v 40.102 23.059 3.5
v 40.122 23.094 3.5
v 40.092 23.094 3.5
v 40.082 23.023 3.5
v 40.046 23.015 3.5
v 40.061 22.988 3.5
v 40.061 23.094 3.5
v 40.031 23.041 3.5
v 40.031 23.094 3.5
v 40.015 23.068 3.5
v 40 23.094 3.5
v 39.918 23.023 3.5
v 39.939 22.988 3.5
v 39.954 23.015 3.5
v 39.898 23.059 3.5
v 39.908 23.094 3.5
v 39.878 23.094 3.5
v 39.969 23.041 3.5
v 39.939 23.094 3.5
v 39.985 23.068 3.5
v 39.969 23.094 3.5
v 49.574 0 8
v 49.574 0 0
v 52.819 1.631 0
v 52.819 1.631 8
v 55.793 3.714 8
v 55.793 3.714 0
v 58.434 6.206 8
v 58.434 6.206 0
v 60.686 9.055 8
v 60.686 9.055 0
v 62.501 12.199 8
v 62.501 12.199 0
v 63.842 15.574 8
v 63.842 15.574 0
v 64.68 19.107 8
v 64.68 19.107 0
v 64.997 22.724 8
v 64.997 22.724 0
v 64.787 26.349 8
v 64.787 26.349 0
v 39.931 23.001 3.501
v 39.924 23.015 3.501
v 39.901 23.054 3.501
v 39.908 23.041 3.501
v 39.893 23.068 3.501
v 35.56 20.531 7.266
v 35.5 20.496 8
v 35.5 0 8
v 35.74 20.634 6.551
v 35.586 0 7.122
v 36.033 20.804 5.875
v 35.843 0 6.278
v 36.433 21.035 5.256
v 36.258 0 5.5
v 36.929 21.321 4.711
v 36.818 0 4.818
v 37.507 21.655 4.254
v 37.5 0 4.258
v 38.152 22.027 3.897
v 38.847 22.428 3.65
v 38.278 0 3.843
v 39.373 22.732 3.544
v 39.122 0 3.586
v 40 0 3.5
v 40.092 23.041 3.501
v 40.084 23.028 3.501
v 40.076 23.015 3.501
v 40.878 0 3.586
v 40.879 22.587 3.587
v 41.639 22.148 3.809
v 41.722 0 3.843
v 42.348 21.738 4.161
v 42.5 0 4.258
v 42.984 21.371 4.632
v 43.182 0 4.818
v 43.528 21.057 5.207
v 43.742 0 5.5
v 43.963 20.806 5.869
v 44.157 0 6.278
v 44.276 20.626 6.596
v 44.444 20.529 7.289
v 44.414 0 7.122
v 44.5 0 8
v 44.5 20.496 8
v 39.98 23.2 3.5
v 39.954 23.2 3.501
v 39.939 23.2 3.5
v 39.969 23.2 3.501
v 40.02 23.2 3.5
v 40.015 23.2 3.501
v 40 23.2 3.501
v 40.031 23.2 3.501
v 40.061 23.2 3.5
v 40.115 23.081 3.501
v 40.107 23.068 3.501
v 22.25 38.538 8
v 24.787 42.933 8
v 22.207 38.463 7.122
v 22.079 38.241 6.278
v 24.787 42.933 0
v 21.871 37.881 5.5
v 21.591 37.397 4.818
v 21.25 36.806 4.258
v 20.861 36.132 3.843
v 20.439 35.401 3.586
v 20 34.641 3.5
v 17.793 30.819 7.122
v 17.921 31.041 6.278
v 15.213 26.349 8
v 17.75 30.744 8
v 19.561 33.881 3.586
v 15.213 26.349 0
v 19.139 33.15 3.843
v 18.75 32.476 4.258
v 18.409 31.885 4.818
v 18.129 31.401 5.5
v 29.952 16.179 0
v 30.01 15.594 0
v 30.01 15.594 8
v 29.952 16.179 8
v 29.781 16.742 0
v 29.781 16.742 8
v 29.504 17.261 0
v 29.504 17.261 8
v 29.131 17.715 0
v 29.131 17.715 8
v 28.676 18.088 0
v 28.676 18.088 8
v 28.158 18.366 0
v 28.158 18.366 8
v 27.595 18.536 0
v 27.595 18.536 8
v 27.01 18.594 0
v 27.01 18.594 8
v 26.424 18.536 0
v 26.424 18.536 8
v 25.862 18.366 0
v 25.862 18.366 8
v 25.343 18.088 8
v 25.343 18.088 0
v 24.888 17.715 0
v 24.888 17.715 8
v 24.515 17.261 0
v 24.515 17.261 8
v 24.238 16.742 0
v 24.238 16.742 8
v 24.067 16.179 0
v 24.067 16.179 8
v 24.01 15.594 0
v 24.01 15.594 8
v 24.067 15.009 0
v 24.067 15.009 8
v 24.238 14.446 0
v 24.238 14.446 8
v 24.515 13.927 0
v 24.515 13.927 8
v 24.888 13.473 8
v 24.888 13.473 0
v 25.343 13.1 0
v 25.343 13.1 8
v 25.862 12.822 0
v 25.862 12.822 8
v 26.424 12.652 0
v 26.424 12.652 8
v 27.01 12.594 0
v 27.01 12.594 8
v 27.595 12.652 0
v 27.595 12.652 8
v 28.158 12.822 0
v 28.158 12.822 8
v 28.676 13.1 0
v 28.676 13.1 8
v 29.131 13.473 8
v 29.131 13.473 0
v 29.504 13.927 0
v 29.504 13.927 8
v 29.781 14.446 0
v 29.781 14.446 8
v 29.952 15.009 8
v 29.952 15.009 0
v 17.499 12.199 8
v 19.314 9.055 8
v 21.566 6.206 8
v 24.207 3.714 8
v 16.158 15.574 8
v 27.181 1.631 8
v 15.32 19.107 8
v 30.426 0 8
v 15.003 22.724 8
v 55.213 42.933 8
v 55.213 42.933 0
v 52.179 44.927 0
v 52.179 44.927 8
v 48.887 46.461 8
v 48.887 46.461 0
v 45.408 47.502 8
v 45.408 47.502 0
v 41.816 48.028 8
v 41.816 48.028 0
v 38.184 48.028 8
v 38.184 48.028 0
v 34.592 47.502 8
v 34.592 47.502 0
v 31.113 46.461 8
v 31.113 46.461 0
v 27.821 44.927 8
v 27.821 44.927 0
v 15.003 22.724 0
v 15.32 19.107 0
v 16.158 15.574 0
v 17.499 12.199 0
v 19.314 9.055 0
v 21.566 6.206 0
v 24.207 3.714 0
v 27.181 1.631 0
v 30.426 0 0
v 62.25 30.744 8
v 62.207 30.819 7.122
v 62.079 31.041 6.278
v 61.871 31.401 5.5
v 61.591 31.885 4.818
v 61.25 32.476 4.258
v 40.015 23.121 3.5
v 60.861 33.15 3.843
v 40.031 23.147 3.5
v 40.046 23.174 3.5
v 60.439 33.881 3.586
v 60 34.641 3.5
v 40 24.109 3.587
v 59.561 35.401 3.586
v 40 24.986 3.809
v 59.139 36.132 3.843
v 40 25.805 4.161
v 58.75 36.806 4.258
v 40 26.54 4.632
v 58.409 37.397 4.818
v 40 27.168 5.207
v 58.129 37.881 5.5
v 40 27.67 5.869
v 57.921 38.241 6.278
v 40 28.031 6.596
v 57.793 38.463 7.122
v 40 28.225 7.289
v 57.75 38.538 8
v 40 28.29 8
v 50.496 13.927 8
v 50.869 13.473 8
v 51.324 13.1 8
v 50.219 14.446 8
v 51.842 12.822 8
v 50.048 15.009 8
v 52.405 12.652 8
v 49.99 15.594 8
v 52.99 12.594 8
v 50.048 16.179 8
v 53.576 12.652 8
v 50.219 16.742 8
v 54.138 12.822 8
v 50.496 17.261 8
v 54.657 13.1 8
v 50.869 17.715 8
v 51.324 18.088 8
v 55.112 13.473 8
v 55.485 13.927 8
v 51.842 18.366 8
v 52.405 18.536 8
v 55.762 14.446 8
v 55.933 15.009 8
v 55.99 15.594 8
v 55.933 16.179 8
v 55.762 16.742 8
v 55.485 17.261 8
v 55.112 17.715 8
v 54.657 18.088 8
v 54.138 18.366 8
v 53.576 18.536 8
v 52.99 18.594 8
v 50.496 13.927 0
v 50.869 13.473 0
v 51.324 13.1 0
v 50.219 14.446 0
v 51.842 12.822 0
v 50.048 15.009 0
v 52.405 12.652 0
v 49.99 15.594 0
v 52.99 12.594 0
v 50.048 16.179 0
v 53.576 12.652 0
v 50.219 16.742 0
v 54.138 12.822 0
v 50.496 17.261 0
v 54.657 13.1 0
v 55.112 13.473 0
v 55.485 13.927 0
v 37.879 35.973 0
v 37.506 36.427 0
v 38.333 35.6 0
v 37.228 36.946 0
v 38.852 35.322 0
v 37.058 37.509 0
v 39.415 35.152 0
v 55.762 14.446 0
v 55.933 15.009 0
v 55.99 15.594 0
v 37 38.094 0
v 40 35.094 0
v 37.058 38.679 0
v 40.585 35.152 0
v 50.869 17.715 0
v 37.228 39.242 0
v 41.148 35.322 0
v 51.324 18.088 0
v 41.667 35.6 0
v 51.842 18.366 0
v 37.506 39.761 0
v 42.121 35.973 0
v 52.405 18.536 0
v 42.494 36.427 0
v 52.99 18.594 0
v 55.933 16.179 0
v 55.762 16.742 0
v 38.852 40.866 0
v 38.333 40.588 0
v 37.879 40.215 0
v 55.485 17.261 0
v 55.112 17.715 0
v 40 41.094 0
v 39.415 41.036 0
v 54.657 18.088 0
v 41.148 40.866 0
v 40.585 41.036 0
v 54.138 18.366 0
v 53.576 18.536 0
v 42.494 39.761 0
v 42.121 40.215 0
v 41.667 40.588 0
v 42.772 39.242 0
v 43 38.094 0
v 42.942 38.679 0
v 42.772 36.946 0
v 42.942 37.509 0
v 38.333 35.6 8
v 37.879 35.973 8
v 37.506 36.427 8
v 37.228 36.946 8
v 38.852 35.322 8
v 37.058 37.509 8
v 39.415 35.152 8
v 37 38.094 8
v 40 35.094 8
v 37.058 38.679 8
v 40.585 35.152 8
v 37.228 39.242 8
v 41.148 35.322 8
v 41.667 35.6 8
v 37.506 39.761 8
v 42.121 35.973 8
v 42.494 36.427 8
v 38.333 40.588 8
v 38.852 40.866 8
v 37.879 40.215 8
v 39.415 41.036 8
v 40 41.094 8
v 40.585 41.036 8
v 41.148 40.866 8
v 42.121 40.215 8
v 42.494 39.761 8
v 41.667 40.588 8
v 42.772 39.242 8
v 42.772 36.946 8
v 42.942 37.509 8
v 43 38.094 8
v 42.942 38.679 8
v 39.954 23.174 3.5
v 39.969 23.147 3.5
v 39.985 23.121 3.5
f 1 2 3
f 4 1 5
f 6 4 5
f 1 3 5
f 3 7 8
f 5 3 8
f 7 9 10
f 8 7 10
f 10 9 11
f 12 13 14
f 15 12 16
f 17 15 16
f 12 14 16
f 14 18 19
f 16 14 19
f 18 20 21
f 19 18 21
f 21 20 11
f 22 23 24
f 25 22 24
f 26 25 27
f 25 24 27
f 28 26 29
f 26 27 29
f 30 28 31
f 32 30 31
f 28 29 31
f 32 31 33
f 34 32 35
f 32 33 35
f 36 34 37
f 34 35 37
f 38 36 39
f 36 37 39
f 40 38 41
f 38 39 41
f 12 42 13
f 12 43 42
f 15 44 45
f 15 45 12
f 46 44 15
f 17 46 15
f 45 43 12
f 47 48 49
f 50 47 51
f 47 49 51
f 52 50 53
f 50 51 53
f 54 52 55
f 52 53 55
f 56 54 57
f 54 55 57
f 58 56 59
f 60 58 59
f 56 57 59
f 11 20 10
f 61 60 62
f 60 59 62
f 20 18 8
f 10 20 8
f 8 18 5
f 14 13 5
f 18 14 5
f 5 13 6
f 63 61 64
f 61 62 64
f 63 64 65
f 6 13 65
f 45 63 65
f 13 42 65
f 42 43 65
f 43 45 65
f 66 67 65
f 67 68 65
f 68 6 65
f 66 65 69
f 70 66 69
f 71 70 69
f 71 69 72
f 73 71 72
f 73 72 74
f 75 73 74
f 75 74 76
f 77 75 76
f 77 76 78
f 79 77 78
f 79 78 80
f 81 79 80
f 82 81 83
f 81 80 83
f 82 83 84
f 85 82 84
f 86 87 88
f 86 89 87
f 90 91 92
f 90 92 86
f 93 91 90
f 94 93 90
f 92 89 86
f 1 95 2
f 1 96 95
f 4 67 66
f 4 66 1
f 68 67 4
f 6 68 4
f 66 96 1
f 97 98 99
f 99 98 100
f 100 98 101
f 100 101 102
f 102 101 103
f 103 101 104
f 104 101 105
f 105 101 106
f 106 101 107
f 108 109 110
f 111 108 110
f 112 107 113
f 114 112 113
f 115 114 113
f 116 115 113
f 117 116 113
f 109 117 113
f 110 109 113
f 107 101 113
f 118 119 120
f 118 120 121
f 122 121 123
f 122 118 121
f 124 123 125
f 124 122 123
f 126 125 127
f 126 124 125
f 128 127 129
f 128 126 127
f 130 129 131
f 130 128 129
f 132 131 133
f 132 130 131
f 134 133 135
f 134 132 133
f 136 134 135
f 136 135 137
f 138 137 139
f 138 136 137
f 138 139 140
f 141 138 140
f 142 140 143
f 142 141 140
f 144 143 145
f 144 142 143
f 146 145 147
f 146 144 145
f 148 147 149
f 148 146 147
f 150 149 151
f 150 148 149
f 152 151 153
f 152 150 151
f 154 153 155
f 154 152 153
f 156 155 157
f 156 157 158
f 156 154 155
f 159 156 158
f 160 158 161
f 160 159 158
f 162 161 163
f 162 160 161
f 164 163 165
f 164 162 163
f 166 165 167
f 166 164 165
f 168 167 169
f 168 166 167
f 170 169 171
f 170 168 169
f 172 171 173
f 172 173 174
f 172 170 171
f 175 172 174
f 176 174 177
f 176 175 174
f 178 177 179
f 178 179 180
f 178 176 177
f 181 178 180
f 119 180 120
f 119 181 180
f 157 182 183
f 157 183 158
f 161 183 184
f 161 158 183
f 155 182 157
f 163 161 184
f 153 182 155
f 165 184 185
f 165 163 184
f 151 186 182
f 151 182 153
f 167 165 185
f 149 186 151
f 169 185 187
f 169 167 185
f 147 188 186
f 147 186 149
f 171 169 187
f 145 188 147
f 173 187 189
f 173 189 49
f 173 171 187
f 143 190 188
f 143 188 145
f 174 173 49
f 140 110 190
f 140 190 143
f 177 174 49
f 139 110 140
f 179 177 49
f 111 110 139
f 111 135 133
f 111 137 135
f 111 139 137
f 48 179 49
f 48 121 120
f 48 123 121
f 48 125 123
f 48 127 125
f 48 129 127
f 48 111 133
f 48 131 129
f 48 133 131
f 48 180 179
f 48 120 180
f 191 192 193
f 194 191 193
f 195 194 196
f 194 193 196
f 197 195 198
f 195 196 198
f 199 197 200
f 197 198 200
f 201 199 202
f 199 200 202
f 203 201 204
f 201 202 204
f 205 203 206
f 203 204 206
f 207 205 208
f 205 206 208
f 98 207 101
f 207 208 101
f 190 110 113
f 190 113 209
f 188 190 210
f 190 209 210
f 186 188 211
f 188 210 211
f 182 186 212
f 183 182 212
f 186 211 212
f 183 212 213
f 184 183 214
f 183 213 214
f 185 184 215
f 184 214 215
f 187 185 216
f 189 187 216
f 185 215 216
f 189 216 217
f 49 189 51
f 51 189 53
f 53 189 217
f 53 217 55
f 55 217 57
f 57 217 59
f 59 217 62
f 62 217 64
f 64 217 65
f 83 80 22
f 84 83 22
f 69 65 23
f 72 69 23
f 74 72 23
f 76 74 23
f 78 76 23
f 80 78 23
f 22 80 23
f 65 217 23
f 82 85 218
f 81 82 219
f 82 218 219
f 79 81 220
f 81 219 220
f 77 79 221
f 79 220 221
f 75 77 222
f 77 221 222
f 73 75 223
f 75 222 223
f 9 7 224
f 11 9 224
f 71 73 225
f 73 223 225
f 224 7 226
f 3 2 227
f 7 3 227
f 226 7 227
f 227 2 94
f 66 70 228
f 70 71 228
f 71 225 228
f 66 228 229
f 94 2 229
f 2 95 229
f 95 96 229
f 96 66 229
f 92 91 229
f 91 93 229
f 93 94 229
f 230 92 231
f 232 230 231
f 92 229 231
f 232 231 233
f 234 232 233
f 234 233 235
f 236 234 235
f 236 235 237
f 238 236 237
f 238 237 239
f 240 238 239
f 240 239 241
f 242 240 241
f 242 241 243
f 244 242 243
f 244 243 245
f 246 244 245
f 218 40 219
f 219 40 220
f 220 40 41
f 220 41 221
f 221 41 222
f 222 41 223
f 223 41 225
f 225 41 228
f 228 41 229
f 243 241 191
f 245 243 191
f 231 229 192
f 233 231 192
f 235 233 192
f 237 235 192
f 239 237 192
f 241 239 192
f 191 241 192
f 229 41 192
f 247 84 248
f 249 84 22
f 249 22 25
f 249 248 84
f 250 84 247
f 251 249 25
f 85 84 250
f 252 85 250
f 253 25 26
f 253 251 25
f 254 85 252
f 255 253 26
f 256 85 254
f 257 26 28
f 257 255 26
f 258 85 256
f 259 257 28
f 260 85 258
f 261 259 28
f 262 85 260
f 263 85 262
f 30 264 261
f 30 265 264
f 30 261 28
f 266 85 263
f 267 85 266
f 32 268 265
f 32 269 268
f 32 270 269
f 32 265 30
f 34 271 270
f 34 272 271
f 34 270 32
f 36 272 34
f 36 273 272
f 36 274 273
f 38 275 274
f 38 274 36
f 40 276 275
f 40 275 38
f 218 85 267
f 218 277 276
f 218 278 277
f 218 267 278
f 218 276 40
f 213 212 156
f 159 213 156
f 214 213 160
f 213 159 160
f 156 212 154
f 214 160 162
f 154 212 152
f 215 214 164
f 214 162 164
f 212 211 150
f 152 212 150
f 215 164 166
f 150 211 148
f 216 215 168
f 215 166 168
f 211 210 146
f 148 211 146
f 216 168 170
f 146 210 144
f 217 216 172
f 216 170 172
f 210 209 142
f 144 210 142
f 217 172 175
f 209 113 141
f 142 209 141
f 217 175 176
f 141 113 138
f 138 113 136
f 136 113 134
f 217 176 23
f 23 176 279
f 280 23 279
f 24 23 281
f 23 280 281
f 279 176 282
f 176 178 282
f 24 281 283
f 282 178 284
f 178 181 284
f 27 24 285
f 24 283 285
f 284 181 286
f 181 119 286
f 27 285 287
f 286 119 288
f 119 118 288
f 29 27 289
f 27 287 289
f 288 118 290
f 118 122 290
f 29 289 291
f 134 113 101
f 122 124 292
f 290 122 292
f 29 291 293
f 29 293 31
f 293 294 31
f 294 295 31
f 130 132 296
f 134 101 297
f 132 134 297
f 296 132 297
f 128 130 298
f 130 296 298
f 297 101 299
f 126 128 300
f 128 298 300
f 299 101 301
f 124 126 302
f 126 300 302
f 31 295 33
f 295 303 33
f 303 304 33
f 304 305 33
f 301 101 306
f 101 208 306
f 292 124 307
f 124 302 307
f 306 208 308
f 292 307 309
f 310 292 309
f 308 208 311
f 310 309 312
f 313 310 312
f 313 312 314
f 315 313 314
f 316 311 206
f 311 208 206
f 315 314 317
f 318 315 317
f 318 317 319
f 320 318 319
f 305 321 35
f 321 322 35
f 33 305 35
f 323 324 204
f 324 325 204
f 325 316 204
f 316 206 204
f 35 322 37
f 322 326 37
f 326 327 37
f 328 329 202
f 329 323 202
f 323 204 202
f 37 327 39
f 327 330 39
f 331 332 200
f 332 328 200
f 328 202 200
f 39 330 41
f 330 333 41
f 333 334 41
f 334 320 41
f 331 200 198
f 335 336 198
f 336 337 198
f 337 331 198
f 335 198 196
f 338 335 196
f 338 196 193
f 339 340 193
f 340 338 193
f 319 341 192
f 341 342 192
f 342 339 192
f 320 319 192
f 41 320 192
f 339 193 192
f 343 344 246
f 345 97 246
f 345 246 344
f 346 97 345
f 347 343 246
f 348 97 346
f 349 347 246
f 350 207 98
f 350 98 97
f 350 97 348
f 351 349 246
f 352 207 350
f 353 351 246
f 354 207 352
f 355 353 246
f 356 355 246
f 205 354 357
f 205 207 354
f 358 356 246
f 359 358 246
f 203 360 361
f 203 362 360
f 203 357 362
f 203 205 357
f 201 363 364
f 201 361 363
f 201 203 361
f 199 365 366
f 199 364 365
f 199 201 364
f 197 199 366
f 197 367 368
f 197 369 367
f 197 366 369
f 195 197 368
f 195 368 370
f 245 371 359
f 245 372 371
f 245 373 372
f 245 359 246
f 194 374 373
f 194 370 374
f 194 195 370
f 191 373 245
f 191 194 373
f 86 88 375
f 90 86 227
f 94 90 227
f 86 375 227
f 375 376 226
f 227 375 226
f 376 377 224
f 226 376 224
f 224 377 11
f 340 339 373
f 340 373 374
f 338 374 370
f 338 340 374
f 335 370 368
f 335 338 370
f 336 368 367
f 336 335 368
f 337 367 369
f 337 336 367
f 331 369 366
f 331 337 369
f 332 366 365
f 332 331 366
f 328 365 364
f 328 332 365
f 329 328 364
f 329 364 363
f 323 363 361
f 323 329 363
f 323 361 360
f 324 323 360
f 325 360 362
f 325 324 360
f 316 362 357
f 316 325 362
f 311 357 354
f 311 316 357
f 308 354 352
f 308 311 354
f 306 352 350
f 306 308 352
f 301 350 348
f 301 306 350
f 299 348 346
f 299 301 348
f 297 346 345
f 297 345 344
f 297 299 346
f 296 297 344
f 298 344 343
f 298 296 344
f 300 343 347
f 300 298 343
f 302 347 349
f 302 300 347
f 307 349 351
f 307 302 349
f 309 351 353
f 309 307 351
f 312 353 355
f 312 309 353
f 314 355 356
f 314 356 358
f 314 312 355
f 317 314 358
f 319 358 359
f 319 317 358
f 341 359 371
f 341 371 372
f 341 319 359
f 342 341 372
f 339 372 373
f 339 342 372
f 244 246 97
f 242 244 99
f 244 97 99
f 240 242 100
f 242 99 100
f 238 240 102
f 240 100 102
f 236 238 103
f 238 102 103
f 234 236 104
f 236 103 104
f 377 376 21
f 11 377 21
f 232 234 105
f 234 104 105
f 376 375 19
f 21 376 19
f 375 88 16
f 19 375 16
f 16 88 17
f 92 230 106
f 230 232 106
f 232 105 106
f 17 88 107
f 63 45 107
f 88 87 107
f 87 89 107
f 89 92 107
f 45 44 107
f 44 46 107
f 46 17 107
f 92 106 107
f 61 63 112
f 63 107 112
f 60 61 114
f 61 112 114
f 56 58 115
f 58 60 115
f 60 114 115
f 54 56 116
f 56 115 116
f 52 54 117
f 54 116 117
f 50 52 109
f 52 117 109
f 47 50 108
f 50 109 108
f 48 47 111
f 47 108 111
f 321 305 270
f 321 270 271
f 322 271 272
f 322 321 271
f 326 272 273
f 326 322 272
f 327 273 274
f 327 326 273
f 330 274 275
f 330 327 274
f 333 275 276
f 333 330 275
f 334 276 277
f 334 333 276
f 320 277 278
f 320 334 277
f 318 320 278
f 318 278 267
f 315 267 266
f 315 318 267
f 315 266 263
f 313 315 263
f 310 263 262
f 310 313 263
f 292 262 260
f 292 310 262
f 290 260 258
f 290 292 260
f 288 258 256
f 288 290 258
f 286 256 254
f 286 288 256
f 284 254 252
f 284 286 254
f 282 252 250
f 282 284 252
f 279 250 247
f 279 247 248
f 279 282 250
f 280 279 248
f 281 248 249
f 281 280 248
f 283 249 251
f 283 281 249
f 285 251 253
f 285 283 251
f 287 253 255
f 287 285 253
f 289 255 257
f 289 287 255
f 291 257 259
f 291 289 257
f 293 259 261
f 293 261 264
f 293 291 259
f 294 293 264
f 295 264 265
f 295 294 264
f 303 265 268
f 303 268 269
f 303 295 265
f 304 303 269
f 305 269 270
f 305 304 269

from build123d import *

# Parameters (mm, degrees)
F0_R     = 3
F1_DEPTH = 8
F2_R     = 4.5
F3_DEPTH = 23.2
F4_R     = 4.5
F5_DEPTH = 23.2
F6_R     = 4.5
F7_DEPTH = 23.2


with BuildPart() as f1:
    # F0 (on Top) → F1 (new body)
    with BuildSketch(Plane.XY):
        with BuildLine():
            Line((24.7871355388, 42.9325781273), (15.2128644612, 26.3494541755))
            ThreePointArc((15.2128644612, 26.3494541755), (18.3493649054, 10.5940107676), (30.4257289224, 0))
            Line((30.4257289224, 0), (49.5742710776, 0))
            ThreePointArc((49.5742710776, 0), (61.6506350946, 10.5940107676), (64.7871355388, 26.3494541755))
            Line((64.7871355388, 26.3494541755), (55.2128644612, 42.9325781273))
            ThreePointArc((55.2128644612, 42.9325781273), (40, 48.0940107676), (24.7871355388, 42.9325781273))
        make_face()
        with Locations((27.0096189432, 15.5940107676)):
            Circle(F0_R, mode=Mode.SUBTRACT)
        with Locations((52.9903810568, 15.5940107676)):
            Circle(F0_R, mode=Mode.SUBTRACT)
        with Locations((40, 38.0940107676)):
            Circle(F0_R, mode=Mode.SUBTRACT)
    extrude(amount=F1_DEPTH)

    # F2 (on face) → F3 (cut)
    with BuildSketch(Plane.XZ):
        with Locations((40, 8)):
            Circle(F2_R)
    extrude(amount=-F3_DEPTH, mode=Mode.SUBTRACT)

    # F4 (on face) → F5 (cut)
    with BuildSketch(Plane(origin=(60, 34.6410161514, 0), x_dir=(-0.5, 0.8660254038, 0), z_dir=(0.8660254038, 0.5, 0))):
        with Locations((0, 8)):
            Circle(F4_R)
    extrude(amount=-F5_DEPTH, mode=Mode.SUBTRACT)

    # F6 (on face) → F7 (cut)
    with BuildSketch(Plane(origin=(0, 0, 0), x_dir=(-0.5, -0.8660254038, 0), z_dir=(-0.8660254038, 0.5, 0))):
        with Locations((-40, 8)):
            Circle(F6_R)
    extrude(amount=-F7_DEPTH, mode=Mode.SUBTRACT)


solid = f1.part
